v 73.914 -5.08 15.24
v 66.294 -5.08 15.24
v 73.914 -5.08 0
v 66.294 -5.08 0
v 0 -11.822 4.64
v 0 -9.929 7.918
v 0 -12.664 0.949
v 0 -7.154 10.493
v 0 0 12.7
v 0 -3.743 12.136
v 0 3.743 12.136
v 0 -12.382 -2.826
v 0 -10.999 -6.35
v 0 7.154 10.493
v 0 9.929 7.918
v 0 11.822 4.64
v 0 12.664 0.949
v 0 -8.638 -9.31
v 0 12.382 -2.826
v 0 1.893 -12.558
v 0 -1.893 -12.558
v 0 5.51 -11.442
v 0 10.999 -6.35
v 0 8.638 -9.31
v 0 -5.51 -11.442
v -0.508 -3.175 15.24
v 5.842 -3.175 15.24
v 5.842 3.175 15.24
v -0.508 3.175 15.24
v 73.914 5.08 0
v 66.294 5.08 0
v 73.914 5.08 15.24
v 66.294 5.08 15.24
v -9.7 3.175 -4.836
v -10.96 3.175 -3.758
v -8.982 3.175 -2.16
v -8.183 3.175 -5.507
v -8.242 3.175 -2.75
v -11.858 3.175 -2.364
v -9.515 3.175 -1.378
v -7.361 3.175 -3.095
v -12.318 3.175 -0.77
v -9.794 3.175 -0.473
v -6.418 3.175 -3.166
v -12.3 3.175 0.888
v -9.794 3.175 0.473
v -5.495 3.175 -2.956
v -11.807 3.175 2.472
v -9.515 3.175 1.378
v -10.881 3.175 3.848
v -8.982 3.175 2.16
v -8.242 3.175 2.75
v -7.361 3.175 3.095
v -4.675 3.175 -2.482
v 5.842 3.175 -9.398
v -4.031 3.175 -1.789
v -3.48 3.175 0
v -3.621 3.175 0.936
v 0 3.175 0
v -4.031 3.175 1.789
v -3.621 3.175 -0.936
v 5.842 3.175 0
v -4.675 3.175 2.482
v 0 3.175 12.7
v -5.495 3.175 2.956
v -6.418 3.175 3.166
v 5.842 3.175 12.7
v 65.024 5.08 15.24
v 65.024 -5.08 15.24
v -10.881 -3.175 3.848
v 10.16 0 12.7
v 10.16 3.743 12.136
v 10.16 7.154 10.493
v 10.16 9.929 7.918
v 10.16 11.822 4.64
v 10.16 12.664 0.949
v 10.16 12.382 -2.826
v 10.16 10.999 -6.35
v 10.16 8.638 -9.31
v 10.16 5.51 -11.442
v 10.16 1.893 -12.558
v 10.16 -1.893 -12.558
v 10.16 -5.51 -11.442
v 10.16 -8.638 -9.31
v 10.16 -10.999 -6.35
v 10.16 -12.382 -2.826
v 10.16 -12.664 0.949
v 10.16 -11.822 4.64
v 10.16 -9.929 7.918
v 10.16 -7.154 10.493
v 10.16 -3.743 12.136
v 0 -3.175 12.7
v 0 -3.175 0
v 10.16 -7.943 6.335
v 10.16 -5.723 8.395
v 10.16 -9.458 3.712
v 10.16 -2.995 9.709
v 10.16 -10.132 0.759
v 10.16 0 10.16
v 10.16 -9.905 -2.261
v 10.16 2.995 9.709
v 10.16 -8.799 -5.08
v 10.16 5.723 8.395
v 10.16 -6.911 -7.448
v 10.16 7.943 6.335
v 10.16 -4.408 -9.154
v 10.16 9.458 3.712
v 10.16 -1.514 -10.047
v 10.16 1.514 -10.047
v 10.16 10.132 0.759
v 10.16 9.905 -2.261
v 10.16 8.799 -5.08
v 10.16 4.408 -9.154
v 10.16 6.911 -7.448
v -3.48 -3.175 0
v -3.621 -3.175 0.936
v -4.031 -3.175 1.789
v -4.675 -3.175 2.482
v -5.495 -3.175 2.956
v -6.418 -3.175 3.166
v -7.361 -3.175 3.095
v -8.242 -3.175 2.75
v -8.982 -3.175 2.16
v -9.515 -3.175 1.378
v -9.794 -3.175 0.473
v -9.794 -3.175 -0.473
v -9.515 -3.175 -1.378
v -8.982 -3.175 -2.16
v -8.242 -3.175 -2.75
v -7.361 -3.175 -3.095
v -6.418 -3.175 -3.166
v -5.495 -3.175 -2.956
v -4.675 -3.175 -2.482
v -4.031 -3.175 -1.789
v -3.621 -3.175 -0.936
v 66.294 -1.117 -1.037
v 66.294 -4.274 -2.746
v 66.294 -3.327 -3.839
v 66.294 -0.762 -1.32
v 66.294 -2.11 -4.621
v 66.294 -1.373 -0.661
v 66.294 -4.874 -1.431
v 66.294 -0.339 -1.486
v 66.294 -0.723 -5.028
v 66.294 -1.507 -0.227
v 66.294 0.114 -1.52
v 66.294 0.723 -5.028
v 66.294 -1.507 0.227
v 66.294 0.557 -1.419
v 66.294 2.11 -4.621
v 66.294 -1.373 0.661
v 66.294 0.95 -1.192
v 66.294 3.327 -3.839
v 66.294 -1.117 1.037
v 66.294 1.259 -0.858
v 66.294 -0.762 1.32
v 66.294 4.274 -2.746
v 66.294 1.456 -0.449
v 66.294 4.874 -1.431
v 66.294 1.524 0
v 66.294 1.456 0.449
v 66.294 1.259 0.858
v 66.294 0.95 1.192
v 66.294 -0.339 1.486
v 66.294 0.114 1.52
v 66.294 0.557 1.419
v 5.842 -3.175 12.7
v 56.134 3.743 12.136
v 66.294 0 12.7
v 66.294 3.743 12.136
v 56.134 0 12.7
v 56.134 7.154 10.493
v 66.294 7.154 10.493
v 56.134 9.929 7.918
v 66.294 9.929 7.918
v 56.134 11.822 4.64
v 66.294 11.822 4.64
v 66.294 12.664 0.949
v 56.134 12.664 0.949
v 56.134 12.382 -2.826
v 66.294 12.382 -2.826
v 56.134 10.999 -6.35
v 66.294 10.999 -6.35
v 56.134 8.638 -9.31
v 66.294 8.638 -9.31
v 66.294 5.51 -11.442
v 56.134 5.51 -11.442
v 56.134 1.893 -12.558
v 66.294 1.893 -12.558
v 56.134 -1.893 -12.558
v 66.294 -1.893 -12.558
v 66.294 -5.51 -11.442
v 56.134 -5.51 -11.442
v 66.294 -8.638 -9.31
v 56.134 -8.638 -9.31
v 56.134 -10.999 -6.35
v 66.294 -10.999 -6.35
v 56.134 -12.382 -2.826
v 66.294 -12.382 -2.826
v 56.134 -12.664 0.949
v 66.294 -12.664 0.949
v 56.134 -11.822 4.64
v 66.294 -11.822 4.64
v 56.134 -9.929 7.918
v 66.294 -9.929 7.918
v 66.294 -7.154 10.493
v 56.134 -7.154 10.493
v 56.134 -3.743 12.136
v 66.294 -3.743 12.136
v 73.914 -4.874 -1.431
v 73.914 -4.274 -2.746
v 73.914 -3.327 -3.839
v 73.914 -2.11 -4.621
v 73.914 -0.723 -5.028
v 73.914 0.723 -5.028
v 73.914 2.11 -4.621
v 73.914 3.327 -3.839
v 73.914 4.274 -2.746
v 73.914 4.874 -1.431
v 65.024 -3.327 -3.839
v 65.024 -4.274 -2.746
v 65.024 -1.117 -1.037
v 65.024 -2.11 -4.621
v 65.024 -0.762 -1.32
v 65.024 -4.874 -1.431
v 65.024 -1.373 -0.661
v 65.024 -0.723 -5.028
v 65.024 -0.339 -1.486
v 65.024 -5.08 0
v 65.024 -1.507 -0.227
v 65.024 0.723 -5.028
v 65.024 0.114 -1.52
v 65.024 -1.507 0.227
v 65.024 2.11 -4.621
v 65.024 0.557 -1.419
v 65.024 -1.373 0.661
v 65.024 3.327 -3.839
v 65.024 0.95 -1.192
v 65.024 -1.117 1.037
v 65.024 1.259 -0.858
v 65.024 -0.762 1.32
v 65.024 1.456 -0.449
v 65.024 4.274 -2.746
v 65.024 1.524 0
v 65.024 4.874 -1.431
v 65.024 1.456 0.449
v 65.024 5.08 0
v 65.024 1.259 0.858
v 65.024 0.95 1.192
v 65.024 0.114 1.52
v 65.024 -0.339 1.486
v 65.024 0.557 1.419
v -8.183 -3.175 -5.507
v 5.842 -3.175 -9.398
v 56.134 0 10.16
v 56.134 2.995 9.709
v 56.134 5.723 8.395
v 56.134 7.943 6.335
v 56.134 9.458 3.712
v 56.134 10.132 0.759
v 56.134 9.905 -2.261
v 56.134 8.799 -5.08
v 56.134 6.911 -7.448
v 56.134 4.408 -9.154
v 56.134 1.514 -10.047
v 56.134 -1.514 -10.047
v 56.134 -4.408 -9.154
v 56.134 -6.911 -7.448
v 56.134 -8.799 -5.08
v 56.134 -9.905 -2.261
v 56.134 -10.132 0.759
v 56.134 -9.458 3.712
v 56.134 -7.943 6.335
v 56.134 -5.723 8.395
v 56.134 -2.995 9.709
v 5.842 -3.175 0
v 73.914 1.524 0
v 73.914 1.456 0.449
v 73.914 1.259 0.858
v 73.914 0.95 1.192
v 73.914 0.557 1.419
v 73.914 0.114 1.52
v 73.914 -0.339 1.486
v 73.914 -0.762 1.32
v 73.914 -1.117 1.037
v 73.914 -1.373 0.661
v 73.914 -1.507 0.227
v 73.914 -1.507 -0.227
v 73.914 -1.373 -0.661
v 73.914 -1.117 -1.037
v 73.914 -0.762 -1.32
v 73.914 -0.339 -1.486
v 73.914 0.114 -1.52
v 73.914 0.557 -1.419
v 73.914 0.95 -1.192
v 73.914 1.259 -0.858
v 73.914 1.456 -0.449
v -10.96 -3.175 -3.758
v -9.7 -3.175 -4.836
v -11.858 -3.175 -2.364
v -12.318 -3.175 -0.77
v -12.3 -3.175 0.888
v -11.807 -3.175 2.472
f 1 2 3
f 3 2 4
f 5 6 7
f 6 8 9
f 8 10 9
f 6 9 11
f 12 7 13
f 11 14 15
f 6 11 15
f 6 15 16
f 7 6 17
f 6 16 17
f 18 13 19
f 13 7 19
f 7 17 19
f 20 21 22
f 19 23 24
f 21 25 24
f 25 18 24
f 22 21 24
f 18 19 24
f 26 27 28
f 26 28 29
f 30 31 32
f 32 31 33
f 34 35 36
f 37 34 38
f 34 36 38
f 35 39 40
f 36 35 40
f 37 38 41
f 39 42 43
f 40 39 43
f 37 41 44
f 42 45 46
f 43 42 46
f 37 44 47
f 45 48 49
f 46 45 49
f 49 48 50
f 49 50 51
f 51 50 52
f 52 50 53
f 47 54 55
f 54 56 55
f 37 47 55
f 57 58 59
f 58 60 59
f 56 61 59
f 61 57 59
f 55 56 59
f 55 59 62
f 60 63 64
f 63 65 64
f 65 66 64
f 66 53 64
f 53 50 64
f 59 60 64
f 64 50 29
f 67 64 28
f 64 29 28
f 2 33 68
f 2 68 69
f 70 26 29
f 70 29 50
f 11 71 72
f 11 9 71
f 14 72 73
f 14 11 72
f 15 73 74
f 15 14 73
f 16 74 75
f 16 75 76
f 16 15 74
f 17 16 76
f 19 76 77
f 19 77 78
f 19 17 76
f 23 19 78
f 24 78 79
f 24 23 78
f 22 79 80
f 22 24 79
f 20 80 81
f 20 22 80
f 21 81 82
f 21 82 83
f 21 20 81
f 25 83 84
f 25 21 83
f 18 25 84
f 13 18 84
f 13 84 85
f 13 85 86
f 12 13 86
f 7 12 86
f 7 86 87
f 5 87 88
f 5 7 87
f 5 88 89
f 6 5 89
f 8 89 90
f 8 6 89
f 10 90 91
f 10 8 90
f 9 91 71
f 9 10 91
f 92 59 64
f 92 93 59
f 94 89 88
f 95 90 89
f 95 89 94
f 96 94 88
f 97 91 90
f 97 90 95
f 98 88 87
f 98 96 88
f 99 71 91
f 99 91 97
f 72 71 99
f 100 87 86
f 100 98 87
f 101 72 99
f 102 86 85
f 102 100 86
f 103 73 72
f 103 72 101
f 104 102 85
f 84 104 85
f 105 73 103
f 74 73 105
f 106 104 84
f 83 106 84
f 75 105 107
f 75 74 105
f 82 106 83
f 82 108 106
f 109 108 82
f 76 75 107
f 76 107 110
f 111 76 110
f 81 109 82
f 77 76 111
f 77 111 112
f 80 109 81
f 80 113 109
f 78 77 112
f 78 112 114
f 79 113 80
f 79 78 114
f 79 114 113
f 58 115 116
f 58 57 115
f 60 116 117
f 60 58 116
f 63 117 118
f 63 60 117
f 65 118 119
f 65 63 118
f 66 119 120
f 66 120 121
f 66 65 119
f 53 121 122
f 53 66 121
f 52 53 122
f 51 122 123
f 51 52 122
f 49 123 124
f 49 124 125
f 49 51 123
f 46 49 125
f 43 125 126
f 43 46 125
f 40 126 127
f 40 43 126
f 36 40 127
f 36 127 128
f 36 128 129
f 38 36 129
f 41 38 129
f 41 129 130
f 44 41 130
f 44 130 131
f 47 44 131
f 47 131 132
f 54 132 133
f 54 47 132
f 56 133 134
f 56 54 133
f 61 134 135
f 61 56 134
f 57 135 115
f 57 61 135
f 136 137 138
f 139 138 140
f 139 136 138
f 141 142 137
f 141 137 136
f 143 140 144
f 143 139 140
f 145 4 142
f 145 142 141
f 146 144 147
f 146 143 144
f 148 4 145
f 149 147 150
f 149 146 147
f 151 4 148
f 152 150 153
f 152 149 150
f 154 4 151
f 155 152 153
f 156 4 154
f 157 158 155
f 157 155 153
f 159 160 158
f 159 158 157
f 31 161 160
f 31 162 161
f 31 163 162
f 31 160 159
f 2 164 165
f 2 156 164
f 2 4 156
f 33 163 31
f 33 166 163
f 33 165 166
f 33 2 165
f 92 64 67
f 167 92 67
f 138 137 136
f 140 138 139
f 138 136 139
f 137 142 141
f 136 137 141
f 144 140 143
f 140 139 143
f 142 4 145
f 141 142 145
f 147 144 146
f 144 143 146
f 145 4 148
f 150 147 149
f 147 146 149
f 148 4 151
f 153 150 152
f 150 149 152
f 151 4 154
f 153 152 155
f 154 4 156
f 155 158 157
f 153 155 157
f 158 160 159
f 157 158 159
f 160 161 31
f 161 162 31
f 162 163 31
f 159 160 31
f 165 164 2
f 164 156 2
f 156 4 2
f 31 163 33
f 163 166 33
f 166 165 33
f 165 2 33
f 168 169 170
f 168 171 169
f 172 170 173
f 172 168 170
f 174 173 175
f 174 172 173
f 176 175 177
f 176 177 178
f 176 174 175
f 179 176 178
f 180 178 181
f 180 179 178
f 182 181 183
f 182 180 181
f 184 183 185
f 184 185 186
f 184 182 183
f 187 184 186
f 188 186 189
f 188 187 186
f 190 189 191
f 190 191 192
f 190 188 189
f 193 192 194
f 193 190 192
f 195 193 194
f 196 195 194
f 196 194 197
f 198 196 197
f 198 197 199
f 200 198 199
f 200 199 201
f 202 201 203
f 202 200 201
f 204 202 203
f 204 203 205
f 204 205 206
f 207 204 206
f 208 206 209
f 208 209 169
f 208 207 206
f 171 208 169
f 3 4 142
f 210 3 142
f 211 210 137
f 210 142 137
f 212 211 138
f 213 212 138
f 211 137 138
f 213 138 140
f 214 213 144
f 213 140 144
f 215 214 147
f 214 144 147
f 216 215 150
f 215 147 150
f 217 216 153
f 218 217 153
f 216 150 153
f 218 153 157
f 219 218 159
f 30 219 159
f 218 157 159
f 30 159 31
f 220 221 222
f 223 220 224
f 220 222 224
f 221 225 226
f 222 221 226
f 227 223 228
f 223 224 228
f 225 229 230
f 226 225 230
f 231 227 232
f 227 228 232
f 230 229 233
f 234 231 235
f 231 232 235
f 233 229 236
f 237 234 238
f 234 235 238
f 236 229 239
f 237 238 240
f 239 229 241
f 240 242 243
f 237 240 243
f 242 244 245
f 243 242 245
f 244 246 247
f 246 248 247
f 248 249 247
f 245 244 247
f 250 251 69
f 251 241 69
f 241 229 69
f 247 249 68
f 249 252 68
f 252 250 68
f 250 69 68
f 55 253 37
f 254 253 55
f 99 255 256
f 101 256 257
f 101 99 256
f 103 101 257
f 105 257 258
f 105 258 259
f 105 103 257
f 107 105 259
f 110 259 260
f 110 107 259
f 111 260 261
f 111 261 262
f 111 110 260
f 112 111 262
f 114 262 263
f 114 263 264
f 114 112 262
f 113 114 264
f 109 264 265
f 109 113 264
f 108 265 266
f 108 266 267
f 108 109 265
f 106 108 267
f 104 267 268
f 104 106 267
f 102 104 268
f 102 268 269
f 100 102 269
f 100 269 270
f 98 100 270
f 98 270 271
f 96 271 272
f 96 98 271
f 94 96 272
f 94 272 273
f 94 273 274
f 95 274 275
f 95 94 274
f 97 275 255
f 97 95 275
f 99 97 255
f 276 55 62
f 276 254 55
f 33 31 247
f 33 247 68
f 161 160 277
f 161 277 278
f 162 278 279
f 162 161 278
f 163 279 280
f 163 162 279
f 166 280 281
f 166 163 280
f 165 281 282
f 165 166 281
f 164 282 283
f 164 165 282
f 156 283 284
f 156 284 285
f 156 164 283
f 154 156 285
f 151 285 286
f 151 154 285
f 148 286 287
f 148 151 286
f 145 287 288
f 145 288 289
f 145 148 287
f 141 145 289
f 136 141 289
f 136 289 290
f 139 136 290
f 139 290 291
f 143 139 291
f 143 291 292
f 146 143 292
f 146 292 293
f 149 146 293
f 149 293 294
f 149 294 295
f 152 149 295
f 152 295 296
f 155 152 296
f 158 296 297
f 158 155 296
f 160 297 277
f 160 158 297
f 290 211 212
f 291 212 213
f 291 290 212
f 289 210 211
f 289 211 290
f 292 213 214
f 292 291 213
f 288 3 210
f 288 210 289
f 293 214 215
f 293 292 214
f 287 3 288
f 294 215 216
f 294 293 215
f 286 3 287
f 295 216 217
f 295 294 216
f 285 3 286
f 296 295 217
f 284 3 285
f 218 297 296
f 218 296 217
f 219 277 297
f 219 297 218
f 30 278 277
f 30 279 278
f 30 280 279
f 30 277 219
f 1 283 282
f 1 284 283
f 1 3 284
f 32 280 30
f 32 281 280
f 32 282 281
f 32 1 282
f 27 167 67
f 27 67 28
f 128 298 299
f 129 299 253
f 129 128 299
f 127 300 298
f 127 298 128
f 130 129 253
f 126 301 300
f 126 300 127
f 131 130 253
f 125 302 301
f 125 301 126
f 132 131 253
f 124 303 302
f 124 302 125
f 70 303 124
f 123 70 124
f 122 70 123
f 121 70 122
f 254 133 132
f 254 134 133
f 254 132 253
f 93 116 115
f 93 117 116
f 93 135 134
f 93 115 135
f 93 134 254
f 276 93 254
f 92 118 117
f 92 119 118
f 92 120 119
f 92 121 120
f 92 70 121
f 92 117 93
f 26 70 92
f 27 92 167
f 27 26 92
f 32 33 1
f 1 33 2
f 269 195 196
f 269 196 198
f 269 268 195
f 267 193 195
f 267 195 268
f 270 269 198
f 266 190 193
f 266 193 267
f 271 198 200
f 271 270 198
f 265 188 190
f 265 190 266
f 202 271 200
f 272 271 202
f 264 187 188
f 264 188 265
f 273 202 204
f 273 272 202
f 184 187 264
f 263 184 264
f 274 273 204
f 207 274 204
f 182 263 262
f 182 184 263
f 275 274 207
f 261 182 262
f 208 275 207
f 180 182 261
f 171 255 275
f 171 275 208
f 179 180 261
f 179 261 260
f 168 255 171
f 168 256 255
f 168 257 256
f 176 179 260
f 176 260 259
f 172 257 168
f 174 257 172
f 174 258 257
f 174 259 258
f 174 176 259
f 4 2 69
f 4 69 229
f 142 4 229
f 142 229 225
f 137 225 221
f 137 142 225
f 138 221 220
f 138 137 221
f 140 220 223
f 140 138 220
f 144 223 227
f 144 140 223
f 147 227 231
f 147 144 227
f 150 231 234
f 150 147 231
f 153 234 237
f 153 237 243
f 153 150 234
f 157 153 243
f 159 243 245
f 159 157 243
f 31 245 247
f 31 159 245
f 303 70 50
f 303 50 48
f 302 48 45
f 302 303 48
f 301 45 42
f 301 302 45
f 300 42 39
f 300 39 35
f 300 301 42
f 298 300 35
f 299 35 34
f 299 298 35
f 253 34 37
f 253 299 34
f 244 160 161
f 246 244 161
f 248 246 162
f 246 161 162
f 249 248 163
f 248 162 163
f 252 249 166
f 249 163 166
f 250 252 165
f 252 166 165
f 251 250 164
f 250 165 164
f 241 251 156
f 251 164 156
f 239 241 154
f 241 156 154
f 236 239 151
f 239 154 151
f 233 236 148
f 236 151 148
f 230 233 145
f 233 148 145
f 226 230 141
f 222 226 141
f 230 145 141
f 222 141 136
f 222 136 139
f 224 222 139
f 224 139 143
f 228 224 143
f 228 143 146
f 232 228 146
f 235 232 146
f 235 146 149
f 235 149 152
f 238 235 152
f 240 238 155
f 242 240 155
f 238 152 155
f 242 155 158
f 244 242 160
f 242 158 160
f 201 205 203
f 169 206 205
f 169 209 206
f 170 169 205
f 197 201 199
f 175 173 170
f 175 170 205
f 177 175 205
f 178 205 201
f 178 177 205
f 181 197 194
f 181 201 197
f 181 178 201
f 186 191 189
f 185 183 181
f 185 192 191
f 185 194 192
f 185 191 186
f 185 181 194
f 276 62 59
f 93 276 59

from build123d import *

# Parameters (mm, degrees)
F0_W     = 5.842
F0_H     = 12.7
F0_R     = 3.175
F2_DEPTH = 3.175
F3_R     = 1.524
F4_DEPTH = 7.62
F5_DEPTH = 1.27


with BuildPart() as f1:
    # F0 (on Front) → F1 (revolve)
    with BuildSketch(Plane.XZ):
        with Locations((2.921, 6.35)):
            Rectangle(F0_W, F0_H)
        Polygon((5.842, 12.7), (5.842, 0), (66.294, 0), (66.294, 12.7), (56.134, 12.7), (56.134, 10.16), (10.16, 10.16), (10.16, 12.7), align=None)
    revolve(axis=Axis((33.147, 0, 0), (-1, 0, 0)))


with BuildPart() as f2:
    # F0 (on Front) → F2 (new body, symmetric)
    with BuildSketch(Plane.XZ):
        with BuildLine():
            Line((-0.9398, 0), (0, 0))
            Line((0, 0), (0, 12.7))
            Line((0, 12.7), (5.842, 12.7))
            Line((5.842, 12.7), (5.842, 15.24))
            Line((5.842, 15.24), (-0.508, 15.24))
            Line((-0.508, 15.24), (-10.8806298187, 3.8475430269))
            ThreePointArc((-10.8806298187, 3.8475430269), (-4.5919612295, 5.3297205562), (-0.9398, 0))
        make_face()
        with BuildLine():
            ThreePointArc((-8.1826630726, -5.5069827884), (-3.1957909266, -4.5493385486), (-0.9398, 0))
            ThreePointArc((-0.9398, 0), (-4.5919612295, 5.3297205562), (-10.8806298187, 3.8475430269))
            ThreePointArc((-10.8806298187, 3.8475430269), (-12.1459778134, -1.5837270034), (-8.1826630726, -5.5069827884))
        make_face()
        with Locations((-6.6548, 0)):
            Circle(F0_R, mode=Mode.SUBTRACT)
        with BuildLine():
            Line((5.842, 0), (0, 0))
            Line((0, 0), (-0.9398, 0))
            ThreePointArc((-0.9398, 0), (-3.1957909266, -4.5493385486), (-8.1826630726, -5.5069827884))
            Line((-8.1826630726, -5.5069827884), (5.842, -9.398))
            Line((5.842, -9.398), (5.842, 0))
        make_face()
    extrude(amount=F2_DEPTH, both=True)


with BuildPart() as f4:
    # F3 (on face) → F4 (new body)
    with BuildSketch(Plane.YZ.offset(66.294)):
        with BuildLine():
            ThreePointArc((-5.08, 11.6397422652), (0, 12.7), (5.08, 11.6397422652))
            Line((5.08, 11.6397422652), (5.08, 15.24))
            Line((5.08, 15.24), (-5.08, 15.24))
            Line((-5.08, 15.24), (-5.08, 11.6397422652))
        make_face()
        with BuildLine():
            ThreePointArc((-5.08, 0), (0, 5.08), (5.08, 0))
            Line((5.08, 0), (5.08, 11.6397422652))
            ThreePointArc((5.08, 11.6397422652), (0, 12.7), (-5.08, 11.6397422652))
            Line((-5.08, 11.6397422652), (-5.08, 0))
        make_face()
        with BuildLine():
            ThreePointArc((-5.08, 0), (0, -5.08), (5.08, 0))
            ThreePointArc((5.08, 0), (0, 5.08), (-5.08, 0))
        make_face()
        Circle(F3_R, mode=Mode.SUBTRACT)
    extrude(amount=F4_DEPTH)


with BuildPart() as f5:
    # F5 (new): a face of the model
    f5_faces = [f4.part.faces().sort_by_distance(p)[0] for p in [
        (66.294, 0, 5.8085929676),
    ]]
    extrude(f5_faces, amount=F5_DEPTH)


solid = Compound([f1.part, f2.part, f4.part, f5.part])
